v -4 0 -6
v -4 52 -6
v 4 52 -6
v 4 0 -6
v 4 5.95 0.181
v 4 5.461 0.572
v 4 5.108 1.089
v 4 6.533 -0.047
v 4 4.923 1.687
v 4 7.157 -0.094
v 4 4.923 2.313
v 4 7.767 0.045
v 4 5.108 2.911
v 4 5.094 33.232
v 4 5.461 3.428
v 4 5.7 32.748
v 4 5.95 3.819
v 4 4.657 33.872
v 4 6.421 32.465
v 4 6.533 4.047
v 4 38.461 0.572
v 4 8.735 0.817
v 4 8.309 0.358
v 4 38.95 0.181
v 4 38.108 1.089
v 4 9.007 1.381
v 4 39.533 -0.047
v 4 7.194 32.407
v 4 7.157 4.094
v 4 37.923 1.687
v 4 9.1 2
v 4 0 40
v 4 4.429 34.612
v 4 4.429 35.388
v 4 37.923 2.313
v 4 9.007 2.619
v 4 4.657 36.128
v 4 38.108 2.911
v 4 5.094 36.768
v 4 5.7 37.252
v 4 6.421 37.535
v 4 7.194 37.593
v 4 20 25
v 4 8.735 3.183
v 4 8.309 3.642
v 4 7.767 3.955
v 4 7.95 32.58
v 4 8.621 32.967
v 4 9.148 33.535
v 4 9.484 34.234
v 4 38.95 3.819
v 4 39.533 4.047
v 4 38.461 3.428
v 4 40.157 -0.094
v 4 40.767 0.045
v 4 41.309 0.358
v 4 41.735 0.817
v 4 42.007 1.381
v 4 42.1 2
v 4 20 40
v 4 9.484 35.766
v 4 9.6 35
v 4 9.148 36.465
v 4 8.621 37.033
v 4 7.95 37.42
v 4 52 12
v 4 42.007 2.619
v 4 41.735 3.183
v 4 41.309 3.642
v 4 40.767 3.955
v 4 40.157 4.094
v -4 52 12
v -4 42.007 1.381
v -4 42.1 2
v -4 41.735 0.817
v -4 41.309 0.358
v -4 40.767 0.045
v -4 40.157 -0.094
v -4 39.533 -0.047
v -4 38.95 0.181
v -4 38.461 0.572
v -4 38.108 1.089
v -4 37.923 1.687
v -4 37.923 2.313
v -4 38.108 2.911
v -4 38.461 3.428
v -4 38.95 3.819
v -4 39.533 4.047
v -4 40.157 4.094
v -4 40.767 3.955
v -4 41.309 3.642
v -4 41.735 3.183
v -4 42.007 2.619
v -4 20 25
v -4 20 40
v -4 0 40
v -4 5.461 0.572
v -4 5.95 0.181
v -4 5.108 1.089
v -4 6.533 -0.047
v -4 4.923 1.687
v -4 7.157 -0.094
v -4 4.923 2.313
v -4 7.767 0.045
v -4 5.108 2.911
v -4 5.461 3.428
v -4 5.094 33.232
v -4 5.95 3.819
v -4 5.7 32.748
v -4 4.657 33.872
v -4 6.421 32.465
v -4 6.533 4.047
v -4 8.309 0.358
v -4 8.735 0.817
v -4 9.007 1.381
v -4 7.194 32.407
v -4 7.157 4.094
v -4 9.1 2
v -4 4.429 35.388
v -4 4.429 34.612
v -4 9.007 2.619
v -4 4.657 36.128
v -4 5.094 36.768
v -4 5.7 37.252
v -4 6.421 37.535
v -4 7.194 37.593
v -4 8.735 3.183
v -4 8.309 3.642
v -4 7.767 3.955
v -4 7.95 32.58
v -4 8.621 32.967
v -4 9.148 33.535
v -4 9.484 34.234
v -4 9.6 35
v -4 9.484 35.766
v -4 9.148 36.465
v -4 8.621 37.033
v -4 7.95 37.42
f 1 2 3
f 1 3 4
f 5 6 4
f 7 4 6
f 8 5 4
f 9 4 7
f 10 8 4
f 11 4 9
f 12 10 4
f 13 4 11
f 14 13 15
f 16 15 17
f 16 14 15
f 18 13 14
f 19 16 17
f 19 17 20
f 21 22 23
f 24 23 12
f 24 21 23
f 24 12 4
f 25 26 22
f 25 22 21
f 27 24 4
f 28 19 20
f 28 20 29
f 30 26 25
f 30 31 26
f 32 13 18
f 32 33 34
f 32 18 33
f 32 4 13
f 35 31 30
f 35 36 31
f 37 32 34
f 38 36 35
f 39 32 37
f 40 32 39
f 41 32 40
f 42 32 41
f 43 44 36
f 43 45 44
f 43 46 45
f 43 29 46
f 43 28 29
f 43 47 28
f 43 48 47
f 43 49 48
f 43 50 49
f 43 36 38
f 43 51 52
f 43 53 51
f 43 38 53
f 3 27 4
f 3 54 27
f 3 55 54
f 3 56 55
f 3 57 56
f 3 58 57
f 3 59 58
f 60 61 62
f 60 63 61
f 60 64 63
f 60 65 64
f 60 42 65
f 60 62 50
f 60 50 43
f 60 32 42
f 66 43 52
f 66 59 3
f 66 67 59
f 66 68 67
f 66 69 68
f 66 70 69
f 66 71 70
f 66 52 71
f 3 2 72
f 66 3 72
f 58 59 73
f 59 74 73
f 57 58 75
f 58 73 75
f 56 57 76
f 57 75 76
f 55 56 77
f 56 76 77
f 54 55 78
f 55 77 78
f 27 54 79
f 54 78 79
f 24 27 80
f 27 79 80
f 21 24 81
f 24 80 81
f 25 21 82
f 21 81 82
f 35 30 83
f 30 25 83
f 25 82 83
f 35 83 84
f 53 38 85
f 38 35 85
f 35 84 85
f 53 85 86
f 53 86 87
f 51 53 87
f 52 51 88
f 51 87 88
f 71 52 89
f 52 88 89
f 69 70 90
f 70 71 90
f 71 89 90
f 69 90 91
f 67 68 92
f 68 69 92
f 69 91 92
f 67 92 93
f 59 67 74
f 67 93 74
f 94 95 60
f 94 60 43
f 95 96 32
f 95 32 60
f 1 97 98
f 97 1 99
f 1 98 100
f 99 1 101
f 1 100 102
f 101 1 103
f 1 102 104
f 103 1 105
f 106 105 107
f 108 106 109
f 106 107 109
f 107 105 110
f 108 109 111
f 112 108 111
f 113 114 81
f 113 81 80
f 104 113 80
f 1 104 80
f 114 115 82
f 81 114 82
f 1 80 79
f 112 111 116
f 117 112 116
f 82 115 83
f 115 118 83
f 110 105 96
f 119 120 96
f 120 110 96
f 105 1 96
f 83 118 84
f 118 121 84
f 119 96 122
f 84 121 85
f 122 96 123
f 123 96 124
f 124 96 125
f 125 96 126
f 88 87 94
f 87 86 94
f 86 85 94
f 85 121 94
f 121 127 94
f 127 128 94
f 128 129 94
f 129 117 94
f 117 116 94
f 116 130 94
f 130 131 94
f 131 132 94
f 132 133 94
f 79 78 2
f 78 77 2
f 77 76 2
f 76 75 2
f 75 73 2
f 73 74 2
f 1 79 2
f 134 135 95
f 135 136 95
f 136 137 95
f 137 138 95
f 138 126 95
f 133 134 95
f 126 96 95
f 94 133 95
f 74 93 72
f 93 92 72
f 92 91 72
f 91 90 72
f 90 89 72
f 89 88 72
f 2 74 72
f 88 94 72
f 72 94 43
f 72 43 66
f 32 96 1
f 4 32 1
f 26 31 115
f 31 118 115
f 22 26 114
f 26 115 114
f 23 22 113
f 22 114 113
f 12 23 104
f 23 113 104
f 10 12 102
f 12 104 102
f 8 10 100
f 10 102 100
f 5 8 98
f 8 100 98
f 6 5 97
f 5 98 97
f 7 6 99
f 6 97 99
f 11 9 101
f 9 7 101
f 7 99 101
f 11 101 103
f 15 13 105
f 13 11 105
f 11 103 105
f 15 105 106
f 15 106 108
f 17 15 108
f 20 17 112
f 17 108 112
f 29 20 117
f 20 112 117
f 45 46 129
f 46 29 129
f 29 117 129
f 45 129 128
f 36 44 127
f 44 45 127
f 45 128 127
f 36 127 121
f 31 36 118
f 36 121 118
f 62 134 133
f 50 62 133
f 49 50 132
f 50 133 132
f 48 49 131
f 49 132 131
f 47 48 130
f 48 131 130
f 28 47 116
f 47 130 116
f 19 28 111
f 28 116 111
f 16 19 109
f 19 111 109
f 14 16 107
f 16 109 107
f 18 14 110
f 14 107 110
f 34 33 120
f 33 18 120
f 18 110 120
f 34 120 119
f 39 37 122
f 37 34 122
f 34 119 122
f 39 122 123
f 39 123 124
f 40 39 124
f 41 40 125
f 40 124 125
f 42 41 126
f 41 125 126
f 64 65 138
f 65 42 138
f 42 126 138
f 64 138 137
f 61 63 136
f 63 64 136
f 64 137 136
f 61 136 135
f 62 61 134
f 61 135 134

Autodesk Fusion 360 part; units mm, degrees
sketch "Sketch1" plane through (0, 0, 0) normal (1, 0, 0) x (0, 1, 0)
  circle A0 centre (7, 2) radius 2.1
  circle A1 centre (40, 2) radius 2.1
  line L0 (52, -6) -> (0, -6)
  line L1 (52, -6) -> (52, 12)
  circle A2 centre (7, 35) radius 2.6
  line L2 (0, 40) -> (20, 40)
  line L3 (20, 40) -> (20, 25)
  line L4 (20, 25) -> (52, 12)
  line L5 (0, 40) -> (0, -6)
  dimension "d2" = 4.2
  dimension "d4" = 4.2
  dimension "d17" = 52
  dimension "d18" = 5.2
  dimension "d19" = 20
  dimension "d20" = 46
extrude "Extrude1" add sketch "Sketch1" along normal mid plane 8
